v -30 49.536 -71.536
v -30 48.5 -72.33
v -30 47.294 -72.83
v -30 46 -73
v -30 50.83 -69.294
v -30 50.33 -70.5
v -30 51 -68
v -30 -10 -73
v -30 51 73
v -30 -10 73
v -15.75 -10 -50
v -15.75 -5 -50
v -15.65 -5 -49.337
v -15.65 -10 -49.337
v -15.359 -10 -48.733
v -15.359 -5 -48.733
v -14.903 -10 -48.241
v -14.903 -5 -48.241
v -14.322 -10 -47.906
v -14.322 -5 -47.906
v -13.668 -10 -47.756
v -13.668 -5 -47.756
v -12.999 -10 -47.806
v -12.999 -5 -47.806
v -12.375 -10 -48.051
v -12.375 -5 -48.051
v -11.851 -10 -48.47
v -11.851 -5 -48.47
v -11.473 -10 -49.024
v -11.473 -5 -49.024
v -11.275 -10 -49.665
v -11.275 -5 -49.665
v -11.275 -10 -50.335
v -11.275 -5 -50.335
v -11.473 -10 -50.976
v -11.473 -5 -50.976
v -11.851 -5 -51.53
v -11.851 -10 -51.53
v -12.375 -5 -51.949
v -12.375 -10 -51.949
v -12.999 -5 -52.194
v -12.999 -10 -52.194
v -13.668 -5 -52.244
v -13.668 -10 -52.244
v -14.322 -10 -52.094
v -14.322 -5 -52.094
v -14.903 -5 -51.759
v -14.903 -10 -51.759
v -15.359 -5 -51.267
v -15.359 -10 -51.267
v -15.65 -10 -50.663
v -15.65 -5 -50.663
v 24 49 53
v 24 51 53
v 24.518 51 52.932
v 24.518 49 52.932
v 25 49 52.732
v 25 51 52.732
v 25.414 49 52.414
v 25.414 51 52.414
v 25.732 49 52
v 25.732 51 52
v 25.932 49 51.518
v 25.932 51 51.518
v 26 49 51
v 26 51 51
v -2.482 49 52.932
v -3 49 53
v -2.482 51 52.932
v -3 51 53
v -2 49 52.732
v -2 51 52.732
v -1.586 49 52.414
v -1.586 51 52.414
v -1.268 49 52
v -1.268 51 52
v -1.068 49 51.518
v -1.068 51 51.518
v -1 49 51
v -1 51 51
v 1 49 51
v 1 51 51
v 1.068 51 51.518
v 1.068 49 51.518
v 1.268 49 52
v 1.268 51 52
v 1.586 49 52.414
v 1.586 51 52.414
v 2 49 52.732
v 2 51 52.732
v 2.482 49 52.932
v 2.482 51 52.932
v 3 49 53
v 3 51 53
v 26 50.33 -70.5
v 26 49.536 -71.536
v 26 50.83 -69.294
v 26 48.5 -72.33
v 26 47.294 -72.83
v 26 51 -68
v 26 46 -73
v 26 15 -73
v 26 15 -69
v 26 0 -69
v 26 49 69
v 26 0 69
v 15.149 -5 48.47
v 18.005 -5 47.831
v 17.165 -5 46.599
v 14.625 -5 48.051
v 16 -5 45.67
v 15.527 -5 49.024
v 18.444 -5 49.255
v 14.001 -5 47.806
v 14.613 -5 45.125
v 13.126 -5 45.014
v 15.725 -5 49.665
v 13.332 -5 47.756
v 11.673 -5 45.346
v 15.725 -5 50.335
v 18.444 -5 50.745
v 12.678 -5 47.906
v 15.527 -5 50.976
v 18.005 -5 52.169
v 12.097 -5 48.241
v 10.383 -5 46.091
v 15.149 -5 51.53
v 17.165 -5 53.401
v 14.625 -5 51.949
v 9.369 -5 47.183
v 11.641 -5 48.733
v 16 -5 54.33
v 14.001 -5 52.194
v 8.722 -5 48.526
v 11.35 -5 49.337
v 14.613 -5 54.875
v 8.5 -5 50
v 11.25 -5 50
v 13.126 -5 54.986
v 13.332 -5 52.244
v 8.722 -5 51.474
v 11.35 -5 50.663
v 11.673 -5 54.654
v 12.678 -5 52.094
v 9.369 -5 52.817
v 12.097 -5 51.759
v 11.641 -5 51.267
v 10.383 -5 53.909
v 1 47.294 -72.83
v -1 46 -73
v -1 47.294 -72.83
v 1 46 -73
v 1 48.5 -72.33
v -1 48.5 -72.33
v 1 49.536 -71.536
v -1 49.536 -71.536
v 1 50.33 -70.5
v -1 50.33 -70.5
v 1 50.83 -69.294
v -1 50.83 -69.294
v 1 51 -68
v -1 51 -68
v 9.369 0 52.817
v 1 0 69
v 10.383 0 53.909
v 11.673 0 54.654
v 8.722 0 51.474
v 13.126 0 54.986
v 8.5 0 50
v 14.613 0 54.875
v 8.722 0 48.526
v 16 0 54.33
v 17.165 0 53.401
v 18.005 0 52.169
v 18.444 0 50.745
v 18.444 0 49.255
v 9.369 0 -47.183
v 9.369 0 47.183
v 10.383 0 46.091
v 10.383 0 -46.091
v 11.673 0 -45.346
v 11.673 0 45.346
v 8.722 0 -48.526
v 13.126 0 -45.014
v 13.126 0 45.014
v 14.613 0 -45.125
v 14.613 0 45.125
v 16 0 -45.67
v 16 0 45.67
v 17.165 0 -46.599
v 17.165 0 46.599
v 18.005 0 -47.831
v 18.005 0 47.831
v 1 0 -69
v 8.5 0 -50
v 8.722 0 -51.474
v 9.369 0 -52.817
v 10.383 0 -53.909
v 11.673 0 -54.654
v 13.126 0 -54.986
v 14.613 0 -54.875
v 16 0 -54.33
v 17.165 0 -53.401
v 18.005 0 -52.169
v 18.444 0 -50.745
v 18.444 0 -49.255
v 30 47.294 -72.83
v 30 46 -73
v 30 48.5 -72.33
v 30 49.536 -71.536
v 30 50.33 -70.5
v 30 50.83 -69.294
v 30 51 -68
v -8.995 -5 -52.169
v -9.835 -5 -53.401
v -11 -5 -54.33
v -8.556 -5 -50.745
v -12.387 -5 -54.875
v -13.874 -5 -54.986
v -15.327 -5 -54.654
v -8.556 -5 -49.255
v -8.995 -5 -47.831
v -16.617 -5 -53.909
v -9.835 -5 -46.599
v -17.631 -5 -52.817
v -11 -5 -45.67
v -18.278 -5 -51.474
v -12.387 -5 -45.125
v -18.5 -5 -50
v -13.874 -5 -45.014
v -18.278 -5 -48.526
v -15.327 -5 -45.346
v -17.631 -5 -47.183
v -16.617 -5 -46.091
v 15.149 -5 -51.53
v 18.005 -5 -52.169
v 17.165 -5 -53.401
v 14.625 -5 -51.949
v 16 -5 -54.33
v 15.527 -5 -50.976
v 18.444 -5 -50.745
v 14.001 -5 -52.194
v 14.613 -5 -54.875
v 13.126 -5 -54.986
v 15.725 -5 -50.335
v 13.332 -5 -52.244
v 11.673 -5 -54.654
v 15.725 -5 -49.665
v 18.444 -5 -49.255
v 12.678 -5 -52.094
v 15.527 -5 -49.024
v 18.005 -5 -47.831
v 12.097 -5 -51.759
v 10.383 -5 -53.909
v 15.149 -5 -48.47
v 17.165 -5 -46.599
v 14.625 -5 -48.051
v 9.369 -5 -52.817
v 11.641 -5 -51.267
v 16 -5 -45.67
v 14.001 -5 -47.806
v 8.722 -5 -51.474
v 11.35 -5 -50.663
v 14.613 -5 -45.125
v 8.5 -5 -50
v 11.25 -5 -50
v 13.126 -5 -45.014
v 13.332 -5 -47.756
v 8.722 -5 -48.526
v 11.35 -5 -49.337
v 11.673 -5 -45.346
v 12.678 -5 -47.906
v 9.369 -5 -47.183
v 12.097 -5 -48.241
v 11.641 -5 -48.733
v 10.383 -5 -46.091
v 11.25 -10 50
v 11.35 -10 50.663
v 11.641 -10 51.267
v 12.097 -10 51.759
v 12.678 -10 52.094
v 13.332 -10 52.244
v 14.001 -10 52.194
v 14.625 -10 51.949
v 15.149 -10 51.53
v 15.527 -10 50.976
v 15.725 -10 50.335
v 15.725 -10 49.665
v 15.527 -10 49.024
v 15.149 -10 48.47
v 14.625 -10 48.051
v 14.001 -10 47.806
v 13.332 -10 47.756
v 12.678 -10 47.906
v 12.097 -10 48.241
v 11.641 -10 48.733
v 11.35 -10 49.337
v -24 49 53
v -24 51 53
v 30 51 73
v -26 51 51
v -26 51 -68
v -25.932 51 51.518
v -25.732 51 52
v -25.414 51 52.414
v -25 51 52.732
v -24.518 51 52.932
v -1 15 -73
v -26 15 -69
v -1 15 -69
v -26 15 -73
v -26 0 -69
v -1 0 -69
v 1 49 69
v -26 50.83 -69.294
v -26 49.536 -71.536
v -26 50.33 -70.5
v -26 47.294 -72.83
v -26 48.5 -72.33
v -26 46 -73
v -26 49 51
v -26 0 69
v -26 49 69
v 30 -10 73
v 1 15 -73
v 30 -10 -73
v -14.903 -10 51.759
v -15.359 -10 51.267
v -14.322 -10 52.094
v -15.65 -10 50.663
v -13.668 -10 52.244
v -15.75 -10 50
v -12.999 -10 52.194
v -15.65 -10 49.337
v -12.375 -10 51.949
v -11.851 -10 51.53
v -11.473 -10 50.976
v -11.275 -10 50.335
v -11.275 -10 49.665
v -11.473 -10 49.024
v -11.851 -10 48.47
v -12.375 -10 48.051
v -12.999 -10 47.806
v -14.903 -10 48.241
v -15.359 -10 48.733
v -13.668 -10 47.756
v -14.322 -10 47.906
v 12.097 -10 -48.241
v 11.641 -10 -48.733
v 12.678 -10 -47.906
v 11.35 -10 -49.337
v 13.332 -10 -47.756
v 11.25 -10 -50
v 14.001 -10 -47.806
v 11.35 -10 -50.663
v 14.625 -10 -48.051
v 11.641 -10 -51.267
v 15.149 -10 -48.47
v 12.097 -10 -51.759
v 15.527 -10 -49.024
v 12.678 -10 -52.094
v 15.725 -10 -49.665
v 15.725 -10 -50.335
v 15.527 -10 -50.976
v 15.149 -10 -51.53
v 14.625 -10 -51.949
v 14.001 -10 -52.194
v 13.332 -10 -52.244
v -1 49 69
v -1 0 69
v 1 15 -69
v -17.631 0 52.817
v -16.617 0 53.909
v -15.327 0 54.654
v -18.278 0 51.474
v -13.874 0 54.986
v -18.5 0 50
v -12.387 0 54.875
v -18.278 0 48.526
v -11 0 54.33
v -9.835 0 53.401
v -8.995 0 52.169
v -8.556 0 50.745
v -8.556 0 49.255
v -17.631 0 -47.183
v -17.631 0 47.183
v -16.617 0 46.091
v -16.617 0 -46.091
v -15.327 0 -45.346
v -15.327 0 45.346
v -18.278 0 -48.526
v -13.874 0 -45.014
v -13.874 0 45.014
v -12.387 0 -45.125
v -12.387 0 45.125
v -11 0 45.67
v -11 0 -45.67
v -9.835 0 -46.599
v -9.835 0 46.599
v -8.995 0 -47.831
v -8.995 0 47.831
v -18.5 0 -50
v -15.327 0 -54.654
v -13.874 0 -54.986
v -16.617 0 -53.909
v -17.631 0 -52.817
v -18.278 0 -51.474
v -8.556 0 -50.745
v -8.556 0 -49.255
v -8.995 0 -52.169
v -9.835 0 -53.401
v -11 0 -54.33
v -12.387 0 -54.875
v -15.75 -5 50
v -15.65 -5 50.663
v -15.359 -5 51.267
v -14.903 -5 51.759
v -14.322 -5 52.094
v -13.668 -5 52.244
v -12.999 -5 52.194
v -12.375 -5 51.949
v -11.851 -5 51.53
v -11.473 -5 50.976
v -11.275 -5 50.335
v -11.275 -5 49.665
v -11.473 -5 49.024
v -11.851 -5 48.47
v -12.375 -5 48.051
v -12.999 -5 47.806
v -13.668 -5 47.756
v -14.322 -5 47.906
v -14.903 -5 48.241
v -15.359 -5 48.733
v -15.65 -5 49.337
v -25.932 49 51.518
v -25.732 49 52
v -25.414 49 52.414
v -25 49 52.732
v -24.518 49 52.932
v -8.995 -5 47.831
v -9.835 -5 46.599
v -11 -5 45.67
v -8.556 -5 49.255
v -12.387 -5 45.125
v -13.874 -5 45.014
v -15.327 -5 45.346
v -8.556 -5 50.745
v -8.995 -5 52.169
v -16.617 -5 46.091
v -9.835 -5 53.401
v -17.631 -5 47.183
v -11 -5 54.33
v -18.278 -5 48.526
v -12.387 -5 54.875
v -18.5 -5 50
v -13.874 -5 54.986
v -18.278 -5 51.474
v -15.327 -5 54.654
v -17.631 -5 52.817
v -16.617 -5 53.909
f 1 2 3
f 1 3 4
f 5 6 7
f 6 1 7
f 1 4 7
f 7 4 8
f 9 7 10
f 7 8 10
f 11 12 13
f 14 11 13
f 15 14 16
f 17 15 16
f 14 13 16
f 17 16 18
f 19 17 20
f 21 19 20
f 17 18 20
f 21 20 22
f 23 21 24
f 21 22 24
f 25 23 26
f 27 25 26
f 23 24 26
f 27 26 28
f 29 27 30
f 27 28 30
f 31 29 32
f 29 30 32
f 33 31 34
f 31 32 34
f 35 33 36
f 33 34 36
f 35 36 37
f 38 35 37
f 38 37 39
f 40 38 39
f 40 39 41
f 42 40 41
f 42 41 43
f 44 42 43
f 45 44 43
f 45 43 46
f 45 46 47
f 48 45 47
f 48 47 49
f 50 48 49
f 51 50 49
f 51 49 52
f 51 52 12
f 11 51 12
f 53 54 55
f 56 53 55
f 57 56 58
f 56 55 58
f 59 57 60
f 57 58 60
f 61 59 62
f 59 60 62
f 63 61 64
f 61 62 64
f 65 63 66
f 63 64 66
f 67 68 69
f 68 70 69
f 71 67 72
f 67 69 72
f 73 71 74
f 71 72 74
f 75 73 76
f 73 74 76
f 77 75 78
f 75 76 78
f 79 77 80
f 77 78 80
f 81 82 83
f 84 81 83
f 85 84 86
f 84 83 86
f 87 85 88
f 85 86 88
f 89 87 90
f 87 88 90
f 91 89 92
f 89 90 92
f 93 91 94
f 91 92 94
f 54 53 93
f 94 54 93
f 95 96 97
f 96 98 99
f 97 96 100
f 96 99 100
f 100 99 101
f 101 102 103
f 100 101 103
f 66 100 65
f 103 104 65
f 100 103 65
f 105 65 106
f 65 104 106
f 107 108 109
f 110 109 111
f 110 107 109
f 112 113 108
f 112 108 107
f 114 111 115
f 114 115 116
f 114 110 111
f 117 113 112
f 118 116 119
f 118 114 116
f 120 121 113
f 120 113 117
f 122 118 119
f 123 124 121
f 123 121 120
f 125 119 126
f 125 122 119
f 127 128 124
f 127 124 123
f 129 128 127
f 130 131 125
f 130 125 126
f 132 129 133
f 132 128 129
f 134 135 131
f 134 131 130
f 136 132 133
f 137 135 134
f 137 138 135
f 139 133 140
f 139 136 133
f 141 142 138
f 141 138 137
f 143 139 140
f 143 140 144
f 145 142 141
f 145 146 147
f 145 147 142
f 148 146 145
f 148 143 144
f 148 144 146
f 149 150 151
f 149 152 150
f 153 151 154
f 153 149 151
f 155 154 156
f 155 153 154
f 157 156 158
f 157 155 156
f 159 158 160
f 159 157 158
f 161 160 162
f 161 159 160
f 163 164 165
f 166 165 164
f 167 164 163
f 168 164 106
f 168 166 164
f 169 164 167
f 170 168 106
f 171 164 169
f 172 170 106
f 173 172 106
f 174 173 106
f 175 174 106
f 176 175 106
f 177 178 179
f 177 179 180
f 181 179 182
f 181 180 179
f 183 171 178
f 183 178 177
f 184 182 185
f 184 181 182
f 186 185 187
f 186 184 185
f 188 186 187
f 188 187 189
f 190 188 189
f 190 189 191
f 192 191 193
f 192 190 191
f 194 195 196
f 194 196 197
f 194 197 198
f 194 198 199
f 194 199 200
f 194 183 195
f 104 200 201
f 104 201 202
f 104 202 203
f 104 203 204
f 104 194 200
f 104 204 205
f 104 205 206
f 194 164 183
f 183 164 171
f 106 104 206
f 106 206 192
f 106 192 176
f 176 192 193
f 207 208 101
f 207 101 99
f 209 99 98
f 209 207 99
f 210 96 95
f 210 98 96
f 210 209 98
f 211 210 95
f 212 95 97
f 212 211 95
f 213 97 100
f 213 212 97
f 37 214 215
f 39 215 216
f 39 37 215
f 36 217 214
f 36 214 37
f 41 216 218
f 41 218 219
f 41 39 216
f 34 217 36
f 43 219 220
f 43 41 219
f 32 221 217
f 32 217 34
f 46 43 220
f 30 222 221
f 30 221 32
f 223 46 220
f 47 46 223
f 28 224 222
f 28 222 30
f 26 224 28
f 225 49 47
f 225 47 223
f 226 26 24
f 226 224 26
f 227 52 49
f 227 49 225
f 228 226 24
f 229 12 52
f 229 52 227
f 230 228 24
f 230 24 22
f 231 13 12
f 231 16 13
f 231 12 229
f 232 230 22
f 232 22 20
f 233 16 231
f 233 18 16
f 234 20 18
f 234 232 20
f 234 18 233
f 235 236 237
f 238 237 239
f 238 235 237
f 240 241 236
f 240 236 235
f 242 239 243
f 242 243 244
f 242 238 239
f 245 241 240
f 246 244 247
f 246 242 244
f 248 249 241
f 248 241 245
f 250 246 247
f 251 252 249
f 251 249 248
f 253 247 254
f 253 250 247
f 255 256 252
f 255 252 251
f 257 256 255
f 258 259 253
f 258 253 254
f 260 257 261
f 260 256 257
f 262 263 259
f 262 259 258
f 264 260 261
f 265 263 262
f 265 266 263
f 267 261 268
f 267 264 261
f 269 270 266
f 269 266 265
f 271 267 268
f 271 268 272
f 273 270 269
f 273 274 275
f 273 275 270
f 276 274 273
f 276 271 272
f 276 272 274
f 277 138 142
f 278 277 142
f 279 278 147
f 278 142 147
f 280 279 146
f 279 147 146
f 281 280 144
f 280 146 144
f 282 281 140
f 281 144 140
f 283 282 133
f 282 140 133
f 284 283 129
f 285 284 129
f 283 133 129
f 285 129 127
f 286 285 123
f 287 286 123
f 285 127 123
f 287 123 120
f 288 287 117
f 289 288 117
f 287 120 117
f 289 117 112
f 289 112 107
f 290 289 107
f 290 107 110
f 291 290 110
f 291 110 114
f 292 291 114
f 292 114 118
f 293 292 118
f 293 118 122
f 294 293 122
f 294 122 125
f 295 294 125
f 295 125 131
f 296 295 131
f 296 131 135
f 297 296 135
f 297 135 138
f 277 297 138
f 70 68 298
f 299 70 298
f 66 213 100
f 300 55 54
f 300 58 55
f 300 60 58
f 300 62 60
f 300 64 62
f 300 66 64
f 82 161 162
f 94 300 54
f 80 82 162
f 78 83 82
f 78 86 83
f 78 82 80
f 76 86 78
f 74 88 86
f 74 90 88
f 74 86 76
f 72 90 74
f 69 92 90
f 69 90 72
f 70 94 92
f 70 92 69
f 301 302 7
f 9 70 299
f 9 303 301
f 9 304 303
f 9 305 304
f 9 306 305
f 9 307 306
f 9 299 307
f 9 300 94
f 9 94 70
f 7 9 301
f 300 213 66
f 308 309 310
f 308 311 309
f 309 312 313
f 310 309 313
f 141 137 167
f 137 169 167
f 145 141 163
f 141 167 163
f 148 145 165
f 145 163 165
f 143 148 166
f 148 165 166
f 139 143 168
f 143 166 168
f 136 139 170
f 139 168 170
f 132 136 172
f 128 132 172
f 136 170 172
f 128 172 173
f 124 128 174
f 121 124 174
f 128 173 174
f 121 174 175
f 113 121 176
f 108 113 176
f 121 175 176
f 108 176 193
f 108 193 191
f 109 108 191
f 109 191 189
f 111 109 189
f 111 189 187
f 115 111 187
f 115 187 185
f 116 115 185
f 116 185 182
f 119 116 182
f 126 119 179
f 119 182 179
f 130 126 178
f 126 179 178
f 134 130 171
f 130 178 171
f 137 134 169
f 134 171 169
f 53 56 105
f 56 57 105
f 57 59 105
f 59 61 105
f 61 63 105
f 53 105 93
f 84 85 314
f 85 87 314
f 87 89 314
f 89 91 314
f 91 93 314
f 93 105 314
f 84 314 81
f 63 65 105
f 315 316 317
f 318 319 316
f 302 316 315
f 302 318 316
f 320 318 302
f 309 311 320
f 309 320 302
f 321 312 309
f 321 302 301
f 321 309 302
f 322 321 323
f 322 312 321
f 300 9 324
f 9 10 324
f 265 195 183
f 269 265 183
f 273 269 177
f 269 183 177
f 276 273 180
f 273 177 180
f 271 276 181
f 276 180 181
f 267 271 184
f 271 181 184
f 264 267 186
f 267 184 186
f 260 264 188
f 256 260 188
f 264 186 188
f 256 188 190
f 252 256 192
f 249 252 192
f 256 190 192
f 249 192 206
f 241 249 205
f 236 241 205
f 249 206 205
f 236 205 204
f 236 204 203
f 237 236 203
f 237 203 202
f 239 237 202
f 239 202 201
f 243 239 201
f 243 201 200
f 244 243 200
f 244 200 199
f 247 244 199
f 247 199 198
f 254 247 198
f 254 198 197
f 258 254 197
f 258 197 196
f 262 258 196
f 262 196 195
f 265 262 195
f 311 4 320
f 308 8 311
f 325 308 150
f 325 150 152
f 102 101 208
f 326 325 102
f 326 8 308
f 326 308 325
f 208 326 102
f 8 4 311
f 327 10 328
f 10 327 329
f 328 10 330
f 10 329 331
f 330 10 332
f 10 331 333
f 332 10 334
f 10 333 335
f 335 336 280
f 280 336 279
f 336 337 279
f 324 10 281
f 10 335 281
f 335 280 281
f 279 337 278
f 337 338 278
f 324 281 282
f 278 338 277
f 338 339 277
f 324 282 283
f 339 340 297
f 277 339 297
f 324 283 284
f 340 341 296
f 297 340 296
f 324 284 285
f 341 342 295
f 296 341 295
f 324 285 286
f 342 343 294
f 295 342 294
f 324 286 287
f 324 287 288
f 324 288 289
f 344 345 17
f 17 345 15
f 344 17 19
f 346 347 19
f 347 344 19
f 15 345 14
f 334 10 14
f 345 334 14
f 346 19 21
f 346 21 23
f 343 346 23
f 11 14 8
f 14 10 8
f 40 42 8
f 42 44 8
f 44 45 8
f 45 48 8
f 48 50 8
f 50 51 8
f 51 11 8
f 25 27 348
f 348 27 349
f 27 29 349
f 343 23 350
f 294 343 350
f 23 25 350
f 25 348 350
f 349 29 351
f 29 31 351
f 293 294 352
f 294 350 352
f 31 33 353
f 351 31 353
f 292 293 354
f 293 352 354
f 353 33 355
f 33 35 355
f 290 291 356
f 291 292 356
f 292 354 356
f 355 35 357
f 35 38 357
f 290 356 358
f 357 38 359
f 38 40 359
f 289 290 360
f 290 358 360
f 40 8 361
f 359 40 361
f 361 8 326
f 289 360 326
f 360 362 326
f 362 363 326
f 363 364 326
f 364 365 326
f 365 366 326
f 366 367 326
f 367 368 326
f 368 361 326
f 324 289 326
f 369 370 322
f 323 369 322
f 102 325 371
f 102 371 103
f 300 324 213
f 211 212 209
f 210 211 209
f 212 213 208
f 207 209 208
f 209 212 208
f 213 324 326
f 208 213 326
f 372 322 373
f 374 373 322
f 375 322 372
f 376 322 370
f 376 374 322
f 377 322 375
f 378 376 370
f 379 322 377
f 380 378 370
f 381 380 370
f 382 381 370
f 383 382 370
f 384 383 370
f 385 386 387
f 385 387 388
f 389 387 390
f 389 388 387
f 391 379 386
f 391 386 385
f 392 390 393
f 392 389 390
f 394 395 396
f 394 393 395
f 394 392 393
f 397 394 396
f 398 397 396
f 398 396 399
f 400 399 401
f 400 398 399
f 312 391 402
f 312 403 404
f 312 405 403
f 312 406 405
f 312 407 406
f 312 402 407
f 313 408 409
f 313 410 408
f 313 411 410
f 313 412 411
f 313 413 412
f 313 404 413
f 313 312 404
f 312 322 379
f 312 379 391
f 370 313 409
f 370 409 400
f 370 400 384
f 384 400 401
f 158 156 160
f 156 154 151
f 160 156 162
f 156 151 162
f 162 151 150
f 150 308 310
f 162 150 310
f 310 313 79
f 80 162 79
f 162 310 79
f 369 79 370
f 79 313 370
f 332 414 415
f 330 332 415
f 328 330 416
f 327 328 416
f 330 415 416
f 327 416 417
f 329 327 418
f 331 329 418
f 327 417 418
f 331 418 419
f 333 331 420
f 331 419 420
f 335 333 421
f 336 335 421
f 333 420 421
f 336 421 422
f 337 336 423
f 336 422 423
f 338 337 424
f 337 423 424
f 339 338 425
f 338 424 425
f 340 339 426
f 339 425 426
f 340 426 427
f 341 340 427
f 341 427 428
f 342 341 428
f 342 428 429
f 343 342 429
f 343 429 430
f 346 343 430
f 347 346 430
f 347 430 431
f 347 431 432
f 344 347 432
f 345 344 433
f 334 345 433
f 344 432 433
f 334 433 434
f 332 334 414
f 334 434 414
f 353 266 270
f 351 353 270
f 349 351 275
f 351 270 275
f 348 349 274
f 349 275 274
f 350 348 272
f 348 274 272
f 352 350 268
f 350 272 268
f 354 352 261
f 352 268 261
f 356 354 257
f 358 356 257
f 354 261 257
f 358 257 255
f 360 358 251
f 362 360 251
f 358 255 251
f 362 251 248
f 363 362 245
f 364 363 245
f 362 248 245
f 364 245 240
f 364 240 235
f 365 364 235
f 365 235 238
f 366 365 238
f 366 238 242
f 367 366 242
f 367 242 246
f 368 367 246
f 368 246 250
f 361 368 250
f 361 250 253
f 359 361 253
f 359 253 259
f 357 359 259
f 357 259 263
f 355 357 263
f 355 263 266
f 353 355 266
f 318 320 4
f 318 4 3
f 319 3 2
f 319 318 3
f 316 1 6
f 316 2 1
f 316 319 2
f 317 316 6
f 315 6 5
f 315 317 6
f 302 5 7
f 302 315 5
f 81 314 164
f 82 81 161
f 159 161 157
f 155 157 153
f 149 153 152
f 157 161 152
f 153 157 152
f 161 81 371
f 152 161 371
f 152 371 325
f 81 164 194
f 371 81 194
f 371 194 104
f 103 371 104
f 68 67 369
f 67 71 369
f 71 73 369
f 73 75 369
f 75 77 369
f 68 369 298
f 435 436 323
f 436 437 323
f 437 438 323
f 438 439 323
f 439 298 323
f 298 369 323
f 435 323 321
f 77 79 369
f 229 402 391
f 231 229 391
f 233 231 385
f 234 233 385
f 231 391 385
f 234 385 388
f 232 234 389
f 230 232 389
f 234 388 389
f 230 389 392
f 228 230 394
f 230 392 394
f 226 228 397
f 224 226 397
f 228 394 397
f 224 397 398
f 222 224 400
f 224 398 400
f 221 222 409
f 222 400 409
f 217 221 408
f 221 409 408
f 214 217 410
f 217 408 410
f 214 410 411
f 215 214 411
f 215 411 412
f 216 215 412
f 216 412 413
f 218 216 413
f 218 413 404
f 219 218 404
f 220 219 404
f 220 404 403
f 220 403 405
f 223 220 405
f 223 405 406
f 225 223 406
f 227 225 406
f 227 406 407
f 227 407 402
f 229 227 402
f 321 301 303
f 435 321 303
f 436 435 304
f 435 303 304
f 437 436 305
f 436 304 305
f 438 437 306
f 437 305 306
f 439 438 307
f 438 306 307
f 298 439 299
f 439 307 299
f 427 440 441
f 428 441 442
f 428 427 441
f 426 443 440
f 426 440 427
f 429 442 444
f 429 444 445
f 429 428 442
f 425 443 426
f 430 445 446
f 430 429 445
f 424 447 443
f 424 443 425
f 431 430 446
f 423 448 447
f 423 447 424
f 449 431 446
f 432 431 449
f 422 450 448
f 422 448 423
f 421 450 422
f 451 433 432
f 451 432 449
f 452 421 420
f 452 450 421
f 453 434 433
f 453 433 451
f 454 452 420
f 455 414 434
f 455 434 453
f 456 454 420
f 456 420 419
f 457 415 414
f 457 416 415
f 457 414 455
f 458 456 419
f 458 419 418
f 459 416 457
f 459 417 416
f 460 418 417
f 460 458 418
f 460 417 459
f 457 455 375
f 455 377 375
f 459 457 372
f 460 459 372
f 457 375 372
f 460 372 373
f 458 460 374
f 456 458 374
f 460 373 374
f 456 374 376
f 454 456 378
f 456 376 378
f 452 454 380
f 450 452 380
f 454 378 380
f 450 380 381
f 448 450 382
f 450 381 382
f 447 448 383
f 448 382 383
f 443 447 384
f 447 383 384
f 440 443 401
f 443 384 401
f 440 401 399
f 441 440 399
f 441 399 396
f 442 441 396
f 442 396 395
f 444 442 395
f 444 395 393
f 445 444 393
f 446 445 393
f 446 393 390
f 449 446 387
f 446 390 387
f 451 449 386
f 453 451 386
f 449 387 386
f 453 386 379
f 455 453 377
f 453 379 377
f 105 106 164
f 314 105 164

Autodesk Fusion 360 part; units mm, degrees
sketch "Sketch1" plane through (0, 0, 0) normal (0, 1, 0) x (1, 0, 0)
  line L0 (-30, 73) -> (30, 73)
  line L1 (30, 73) -> (30, -73)
  line L2 (30, -73) -> (-30, -73)
  line L3 (-30, -73) -> (-30, 73)
  line L4 (-26, 69) -> (-1, 69)
  line L5 (-1, 69) -> (-1, -69)
  line L6 (-1, -69) -> (-26, -69)
  line L7 (-26, -69) -> (-26, 69)
  line L8 (-26, 69) -> (26, 69)
  line L9 (26, 69) -> (26, -69)
  line L10 (26, -69) -> (-26, -69)
  line L11 (-26, -69) -> (-26, 69)
  line L12 (30, -73) -> (-30, 73) construction
  line L13 (26, 69) -> (1, 69)
  line L14 (1, 69) -> (1, -69)
  line L15 (26, -64) -> (26, 69)
  line L16 (-26, 69) -> (-26, 73)
  line L17 (26, 69) -> (26, 73)
  line L18 (-1, 69) -> (-1, 73)
  line L19 (1, 69) -> (1, 73)
  dimension "d1" = 60
  dimension "d2" = 146
  dimension "d3" = 25
  dimension "d4" = 138
  dimension "d5" = 4
  dimension "d6" = 25
  dimension "d7" = 133
extrude "Extrude1" add sketch "Sketch1" along normal blind 49 contours L0 L1 L2 L3 L6 L7 L9 L10 L11 L15 L16 L17 | L0 L8 L18 L19 | L5 L8 L10 L14
extrude "Extrude2" add sketch "Sketch1" against normal blind 10
extrude "Extrude3" add sketch "Sketch1" along normal blind 15 contours L0 L4 L8 L16 L18 | L0 L8 L13 L17 L19
sketch "Sketch2" plane through (0, 49, 0) normal (0, 1, 0) x (-1, 0, 0)
  line L0 (-1, 69) -> (-1, -73)
  line L1 (-1, -73) -> (1, -73)
  line L2 (1, -73) -> (1, 69)
  line L3 (1, 69) -> (26, 69)
  line L4 (26, 69) -> (26, -73)
  line L5 (26, -73) -> (30, -73)
  line L6 (30, -73) -> (30, 73)
  line L7 (30, 73) -> (-30, 73)
  line L8 (-30, 73) -> (-30, -73)
  line L9 (-30, -73) -> (-26, -73)
  line L10 (-26, -73) -> (-26, 69)
  line L11 (-26, 69) -> (-1, 69)
  line L12 (30, 73) -> (-30, 73)
  line L13 (-30, 73) -> (-30, 53)
  line L14 (-30, 53) -> (30, 53)
  line L15 (30, 53) -> (30, 73)
  dimension "d14" = 20
extrude "Extrude4" add sketch "Sketch2" along normal blind 2 contours L0 L2 L3 L4 L6 L7 L8 L10 L11 L12 L13 L14 L15 | L0 L10 L11 L14 | L2 L3 L4 L14
extrude "Extrude5" add 3 faces at (28.6667, 49, 11) (0.3333, 49, -31) (-27.3333, 49, -31) along direction (0, 1, 0) blind 2
fillet "Fillet1" radius 5 3 edges at (28, 51, -73) (0, 51, -73) (-28, 51, -73)
fillet "Fillet2" radius 2 4 edges at (1, 50, 53) (-26, 50, 53) (-1, 50, 53) (26, 50, 53)
sketch "Sketch3" plane through (0, 0, 0) normal (0, 1, 0) x (-1, 0, 0)
  line L0 (1, -69) -> (26, -69)
  line L1 (26, -69) -> (26, 69)
  line L2 (26, 69) -> (1, 69)
  line L3 (1, 69) -> (1, -69)
  circle A0 centre (13.5, -50) radius 2.25
  circle A1 centre (13.5, 50) radius 2.25
  line L4 (13.5, -50) -> (13.5, 50)
  line L5 (26, 0) -> (1, 0)
  dimension "d24" = 4.5
  dimension "d26" = 4.5
  dimension "d43" = 100
extrude "Extrude6" cut sketch "Sketch3" against normal blind 10 contours A0 | A1
sketch "Sketch4" plane through (0, 0, 0) normal (0, 1, 0) x (-1, 0, 0)
  circle A0 centre (13.5, -50) radius 2.25
  circle A1 centre (13.5, 50) radius 2.25
  line L0 (1, -69) -> (26, -69)
  line L1 (26, -69) -> (26, 69)
  line L2 (26, 69) -> (1, 69)
  line L3 (1, 69) -> (1, -69)
  circle A2 centre (13.5, -50) radius 5
  circle A3 centre (13.5, 50) radius 5
  dimension "d29" = 10
  dimension "d30" = 10
extrude "Extrude7" cut sketch "Sketch4" against normal blind 5 contours A2 | A3
sketch "Sketch5" plane through (0, 0, 0) normal (0, 1, 0) x (-1, 0, 0)
  line L0 (-26, -69) -> (-1, -69)
  line L1 (-1, -69) -> (-1, 69)
  line L2 (-1, 69) -> (-26, 69)
  line L3 (-26, 69) -> (-26, -69)
  circle A0 centre (-13.5, -50) radius 2.25
  circle A1 centre (-13.5, 50) radius 2.25
  circle A2 centre (-13.5, -50) radius 5
  circle A3 centre (-13.5, 50) radius 5
  line L4 (-13.5, 50) -> (-13.5, -50)
  line L5 (-1, 0) -> (-26, 0)
  dimension "d35" = 4.5
  dimension "d36" = 4.5
  dimension "d37" = 10
  dimension "d38" = 10
  dimension "d44" = 100
extrude "Extrude8" cut sketch "Sketch5" against normal blind 10 contours A0 | A1
extrude "Extrude9" cut sketch "Sketch5" against normal blind 5 contours A2 | A3
equation "d1 = ( 25 * 2 ) * 1 mm + 10 mm"
equation "d2 = 138 mm + 8 mm"
